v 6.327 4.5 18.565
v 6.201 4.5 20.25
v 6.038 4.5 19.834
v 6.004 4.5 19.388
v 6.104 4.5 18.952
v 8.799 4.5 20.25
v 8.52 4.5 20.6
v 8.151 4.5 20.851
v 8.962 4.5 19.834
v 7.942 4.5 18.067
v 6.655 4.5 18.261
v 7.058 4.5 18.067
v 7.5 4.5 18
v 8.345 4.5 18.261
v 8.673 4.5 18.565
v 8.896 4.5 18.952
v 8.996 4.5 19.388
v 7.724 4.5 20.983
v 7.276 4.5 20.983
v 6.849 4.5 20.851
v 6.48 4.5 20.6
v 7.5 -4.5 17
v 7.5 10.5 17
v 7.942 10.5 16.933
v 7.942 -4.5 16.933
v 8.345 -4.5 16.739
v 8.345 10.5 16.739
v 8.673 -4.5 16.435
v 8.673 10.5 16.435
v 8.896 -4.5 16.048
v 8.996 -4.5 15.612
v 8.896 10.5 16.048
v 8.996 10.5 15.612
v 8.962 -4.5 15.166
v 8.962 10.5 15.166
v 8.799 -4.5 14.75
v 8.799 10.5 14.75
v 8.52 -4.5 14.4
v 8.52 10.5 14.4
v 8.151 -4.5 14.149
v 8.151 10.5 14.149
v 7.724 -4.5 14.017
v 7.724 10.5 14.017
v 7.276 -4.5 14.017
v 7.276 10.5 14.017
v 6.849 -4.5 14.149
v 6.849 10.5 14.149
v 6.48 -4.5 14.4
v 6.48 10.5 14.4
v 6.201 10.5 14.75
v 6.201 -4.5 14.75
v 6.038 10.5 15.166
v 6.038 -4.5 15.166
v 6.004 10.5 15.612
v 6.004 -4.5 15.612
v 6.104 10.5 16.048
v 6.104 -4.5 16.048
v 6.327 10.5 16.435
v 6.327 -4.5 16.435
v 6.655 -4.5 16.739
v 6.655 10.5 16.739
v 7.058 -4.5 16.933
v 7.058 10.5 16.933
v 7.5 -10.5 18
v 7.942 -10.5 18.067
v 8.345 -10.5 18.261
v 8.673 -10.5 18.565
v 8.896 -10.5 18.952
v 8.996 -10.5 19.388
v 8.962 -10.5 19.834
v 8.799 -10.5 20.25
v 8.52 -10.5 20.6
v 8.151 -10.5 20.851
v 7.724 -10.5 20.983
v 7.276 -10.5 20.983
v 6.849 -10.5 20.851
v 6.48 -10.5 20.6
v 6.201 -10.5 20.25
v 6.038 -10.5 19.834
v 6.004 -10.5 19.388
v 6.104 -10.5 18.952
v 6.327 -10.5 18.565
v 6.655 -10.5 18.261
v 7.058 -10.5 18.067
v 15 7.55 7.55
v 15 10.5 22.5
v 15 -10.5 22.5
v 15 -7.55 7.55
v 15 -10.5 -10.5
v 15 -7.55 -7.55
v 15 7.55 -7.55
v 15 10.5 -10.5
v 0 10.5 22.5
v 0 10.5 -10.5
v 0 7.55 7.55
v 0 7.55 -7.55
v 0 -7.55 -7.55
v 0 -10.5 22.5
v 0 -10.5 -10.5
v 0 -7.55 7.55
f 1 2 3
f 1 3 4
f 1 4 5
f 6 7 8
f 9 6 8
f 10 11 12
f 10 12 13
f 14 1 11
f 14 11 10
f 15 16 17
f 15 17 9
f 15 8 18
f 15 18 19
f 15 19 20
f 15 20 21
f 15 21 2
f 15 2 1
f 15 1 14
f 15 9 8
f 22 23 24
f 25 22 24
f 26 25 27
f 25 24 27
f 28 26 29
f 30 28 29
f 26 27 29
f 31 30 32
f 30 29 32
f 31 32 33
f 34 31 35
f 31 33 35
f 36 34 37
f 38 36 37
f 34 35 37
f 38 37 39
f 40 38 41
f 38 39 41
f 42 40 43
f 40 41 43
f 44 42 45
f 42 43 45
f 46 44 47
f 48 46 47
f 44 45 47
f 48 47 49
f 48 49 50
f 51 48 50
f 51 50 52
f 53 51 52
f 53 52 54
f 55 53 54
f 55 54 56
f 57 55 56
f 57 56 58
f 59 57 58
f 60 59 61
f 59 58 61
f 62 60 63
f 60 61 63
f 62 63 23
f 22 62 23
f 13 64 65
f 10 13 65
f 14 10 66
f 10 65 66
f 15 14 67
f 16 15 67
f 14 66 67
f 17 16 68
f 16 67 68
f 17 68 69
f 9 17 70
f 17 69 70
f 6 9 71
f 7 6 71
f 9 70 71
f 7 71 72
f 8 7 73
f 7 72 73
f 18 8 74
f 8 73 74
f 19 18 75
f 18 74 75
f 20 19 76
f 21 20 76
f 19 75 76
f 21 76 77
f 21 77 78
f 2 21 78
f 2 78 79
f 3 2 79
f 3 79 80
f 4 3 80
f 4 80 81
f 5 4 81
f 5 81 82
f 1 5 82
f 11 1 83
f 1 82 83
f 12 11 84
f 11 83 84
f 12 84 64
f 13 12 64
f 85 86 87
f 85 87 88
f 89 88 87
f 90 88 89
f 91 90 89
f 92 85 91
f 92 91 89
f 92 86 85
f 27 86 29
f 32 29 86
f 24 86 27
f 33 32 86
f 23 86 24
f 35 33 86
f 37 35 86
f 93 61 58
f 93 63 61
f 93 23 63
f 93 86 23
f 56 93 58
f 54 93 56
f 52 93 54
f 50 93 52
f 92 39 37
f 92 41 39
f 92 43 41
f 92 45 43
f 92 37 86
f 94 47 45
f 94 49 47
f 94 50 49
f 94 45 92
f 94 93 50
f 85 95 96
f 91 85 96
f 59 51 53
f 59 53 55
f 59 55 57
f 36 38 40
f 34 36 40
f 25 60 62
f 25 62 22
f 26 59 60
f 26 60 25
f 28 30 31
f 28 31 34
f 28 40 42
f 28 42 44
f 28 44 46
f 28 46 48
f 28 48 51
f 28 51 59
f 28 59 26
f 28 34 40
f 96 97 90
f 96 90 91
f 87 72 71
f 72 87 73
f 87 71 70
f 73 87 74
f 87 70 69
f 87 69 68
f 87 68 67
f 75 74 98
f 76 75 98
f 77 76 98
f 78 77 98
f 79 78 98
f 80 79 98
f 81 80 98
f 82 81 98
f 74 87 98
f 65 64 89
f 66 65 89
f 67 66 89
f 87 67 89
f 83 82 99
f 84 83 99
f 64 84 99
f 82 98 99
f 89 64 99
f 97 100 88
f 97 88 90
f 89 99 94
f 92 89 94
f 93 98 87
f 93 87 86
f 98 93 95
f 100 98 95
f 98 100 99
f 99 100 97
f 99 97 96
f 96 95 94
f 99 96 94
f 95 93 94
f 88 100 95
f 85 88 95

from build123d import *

# Parameters (mm, degrees)
SCHIZZO1_W                   = 12
SCHIZZO1_H                   = 21
SCHIZZO1_W_2                 = 21
SCHIZZO1_W_3                 = 15.1
SCHIZZO1_H_2                 = 15.1
ESTRUSIONE_ESTRUSIONE1_DEPTH = 15
SCHIZZO2_R                   = 1.5
TAGLIO_ESTRUSIONE1_DEPTH     = 15
SCHIZZO3_R                   = 1.5
TAGLIO_ESTRUSIONE2_DEPTH     = 15


with BuildPart() as part:
    # Schizzo1 → Estrusione-Estrusione1 (new body)
    # profile 1 of 2: a face of its own
    with BuildSketch(Plane(origin=(0, 0, 0), x_dir=(0, 0, -1), z_dir=(1, 0, 0))):
        with Locations((-16.5, 0)):
            Rectangle(SCHIZZO1_W, SCHIZZO1_H)
    # profile 2 of 2: a face of its own
    with BuildSketch(Plane(origin=(0, 0, 0), x_dir=(0, 0, -1), z_dir=(1, 0, 0))):
        Rectangle(SCHIZZO1_W_2, SCHIZZO1_H)
        Rectangle(SCHIZZO1_W_3, SCHIZZO1_H_2, mode=Mode.SUBTRACT)
    extrude(amount=ESTRUSIONE_ESTRUSIONE1_DEPTH)

    # Schizzo2 → Taglio-Estrusione1 (cut)
    with BuildSketch(Plane(origin=(0, 10.5, 0), x_dir=(1, 0, 0), z_dir=(0, 1, 0))):
        with Locations(Location((7.5, -15.5, 0), (0, 0, 270))):
            Circle(SCHIZZO2_R)
    extrude(amount=-TAGLIO_ESTRUSIONE1_DEPTH, mode=Mode.SUBTRACT)

    # Schizzo3 → Taglio-Estrusione2 (cut)
    with BuildSketch(Plane.XZ.offset(10.5)):
        with Locations(Location((7.5, 19.5, 0), (0, 0, 270))):
            Circle(SCHIZZO3_R)
    extrude(amount=-TAGLIO_ESTRUSIONE2_DEPTH, mode=Mode.SUBTRACT)


solid = part.part
